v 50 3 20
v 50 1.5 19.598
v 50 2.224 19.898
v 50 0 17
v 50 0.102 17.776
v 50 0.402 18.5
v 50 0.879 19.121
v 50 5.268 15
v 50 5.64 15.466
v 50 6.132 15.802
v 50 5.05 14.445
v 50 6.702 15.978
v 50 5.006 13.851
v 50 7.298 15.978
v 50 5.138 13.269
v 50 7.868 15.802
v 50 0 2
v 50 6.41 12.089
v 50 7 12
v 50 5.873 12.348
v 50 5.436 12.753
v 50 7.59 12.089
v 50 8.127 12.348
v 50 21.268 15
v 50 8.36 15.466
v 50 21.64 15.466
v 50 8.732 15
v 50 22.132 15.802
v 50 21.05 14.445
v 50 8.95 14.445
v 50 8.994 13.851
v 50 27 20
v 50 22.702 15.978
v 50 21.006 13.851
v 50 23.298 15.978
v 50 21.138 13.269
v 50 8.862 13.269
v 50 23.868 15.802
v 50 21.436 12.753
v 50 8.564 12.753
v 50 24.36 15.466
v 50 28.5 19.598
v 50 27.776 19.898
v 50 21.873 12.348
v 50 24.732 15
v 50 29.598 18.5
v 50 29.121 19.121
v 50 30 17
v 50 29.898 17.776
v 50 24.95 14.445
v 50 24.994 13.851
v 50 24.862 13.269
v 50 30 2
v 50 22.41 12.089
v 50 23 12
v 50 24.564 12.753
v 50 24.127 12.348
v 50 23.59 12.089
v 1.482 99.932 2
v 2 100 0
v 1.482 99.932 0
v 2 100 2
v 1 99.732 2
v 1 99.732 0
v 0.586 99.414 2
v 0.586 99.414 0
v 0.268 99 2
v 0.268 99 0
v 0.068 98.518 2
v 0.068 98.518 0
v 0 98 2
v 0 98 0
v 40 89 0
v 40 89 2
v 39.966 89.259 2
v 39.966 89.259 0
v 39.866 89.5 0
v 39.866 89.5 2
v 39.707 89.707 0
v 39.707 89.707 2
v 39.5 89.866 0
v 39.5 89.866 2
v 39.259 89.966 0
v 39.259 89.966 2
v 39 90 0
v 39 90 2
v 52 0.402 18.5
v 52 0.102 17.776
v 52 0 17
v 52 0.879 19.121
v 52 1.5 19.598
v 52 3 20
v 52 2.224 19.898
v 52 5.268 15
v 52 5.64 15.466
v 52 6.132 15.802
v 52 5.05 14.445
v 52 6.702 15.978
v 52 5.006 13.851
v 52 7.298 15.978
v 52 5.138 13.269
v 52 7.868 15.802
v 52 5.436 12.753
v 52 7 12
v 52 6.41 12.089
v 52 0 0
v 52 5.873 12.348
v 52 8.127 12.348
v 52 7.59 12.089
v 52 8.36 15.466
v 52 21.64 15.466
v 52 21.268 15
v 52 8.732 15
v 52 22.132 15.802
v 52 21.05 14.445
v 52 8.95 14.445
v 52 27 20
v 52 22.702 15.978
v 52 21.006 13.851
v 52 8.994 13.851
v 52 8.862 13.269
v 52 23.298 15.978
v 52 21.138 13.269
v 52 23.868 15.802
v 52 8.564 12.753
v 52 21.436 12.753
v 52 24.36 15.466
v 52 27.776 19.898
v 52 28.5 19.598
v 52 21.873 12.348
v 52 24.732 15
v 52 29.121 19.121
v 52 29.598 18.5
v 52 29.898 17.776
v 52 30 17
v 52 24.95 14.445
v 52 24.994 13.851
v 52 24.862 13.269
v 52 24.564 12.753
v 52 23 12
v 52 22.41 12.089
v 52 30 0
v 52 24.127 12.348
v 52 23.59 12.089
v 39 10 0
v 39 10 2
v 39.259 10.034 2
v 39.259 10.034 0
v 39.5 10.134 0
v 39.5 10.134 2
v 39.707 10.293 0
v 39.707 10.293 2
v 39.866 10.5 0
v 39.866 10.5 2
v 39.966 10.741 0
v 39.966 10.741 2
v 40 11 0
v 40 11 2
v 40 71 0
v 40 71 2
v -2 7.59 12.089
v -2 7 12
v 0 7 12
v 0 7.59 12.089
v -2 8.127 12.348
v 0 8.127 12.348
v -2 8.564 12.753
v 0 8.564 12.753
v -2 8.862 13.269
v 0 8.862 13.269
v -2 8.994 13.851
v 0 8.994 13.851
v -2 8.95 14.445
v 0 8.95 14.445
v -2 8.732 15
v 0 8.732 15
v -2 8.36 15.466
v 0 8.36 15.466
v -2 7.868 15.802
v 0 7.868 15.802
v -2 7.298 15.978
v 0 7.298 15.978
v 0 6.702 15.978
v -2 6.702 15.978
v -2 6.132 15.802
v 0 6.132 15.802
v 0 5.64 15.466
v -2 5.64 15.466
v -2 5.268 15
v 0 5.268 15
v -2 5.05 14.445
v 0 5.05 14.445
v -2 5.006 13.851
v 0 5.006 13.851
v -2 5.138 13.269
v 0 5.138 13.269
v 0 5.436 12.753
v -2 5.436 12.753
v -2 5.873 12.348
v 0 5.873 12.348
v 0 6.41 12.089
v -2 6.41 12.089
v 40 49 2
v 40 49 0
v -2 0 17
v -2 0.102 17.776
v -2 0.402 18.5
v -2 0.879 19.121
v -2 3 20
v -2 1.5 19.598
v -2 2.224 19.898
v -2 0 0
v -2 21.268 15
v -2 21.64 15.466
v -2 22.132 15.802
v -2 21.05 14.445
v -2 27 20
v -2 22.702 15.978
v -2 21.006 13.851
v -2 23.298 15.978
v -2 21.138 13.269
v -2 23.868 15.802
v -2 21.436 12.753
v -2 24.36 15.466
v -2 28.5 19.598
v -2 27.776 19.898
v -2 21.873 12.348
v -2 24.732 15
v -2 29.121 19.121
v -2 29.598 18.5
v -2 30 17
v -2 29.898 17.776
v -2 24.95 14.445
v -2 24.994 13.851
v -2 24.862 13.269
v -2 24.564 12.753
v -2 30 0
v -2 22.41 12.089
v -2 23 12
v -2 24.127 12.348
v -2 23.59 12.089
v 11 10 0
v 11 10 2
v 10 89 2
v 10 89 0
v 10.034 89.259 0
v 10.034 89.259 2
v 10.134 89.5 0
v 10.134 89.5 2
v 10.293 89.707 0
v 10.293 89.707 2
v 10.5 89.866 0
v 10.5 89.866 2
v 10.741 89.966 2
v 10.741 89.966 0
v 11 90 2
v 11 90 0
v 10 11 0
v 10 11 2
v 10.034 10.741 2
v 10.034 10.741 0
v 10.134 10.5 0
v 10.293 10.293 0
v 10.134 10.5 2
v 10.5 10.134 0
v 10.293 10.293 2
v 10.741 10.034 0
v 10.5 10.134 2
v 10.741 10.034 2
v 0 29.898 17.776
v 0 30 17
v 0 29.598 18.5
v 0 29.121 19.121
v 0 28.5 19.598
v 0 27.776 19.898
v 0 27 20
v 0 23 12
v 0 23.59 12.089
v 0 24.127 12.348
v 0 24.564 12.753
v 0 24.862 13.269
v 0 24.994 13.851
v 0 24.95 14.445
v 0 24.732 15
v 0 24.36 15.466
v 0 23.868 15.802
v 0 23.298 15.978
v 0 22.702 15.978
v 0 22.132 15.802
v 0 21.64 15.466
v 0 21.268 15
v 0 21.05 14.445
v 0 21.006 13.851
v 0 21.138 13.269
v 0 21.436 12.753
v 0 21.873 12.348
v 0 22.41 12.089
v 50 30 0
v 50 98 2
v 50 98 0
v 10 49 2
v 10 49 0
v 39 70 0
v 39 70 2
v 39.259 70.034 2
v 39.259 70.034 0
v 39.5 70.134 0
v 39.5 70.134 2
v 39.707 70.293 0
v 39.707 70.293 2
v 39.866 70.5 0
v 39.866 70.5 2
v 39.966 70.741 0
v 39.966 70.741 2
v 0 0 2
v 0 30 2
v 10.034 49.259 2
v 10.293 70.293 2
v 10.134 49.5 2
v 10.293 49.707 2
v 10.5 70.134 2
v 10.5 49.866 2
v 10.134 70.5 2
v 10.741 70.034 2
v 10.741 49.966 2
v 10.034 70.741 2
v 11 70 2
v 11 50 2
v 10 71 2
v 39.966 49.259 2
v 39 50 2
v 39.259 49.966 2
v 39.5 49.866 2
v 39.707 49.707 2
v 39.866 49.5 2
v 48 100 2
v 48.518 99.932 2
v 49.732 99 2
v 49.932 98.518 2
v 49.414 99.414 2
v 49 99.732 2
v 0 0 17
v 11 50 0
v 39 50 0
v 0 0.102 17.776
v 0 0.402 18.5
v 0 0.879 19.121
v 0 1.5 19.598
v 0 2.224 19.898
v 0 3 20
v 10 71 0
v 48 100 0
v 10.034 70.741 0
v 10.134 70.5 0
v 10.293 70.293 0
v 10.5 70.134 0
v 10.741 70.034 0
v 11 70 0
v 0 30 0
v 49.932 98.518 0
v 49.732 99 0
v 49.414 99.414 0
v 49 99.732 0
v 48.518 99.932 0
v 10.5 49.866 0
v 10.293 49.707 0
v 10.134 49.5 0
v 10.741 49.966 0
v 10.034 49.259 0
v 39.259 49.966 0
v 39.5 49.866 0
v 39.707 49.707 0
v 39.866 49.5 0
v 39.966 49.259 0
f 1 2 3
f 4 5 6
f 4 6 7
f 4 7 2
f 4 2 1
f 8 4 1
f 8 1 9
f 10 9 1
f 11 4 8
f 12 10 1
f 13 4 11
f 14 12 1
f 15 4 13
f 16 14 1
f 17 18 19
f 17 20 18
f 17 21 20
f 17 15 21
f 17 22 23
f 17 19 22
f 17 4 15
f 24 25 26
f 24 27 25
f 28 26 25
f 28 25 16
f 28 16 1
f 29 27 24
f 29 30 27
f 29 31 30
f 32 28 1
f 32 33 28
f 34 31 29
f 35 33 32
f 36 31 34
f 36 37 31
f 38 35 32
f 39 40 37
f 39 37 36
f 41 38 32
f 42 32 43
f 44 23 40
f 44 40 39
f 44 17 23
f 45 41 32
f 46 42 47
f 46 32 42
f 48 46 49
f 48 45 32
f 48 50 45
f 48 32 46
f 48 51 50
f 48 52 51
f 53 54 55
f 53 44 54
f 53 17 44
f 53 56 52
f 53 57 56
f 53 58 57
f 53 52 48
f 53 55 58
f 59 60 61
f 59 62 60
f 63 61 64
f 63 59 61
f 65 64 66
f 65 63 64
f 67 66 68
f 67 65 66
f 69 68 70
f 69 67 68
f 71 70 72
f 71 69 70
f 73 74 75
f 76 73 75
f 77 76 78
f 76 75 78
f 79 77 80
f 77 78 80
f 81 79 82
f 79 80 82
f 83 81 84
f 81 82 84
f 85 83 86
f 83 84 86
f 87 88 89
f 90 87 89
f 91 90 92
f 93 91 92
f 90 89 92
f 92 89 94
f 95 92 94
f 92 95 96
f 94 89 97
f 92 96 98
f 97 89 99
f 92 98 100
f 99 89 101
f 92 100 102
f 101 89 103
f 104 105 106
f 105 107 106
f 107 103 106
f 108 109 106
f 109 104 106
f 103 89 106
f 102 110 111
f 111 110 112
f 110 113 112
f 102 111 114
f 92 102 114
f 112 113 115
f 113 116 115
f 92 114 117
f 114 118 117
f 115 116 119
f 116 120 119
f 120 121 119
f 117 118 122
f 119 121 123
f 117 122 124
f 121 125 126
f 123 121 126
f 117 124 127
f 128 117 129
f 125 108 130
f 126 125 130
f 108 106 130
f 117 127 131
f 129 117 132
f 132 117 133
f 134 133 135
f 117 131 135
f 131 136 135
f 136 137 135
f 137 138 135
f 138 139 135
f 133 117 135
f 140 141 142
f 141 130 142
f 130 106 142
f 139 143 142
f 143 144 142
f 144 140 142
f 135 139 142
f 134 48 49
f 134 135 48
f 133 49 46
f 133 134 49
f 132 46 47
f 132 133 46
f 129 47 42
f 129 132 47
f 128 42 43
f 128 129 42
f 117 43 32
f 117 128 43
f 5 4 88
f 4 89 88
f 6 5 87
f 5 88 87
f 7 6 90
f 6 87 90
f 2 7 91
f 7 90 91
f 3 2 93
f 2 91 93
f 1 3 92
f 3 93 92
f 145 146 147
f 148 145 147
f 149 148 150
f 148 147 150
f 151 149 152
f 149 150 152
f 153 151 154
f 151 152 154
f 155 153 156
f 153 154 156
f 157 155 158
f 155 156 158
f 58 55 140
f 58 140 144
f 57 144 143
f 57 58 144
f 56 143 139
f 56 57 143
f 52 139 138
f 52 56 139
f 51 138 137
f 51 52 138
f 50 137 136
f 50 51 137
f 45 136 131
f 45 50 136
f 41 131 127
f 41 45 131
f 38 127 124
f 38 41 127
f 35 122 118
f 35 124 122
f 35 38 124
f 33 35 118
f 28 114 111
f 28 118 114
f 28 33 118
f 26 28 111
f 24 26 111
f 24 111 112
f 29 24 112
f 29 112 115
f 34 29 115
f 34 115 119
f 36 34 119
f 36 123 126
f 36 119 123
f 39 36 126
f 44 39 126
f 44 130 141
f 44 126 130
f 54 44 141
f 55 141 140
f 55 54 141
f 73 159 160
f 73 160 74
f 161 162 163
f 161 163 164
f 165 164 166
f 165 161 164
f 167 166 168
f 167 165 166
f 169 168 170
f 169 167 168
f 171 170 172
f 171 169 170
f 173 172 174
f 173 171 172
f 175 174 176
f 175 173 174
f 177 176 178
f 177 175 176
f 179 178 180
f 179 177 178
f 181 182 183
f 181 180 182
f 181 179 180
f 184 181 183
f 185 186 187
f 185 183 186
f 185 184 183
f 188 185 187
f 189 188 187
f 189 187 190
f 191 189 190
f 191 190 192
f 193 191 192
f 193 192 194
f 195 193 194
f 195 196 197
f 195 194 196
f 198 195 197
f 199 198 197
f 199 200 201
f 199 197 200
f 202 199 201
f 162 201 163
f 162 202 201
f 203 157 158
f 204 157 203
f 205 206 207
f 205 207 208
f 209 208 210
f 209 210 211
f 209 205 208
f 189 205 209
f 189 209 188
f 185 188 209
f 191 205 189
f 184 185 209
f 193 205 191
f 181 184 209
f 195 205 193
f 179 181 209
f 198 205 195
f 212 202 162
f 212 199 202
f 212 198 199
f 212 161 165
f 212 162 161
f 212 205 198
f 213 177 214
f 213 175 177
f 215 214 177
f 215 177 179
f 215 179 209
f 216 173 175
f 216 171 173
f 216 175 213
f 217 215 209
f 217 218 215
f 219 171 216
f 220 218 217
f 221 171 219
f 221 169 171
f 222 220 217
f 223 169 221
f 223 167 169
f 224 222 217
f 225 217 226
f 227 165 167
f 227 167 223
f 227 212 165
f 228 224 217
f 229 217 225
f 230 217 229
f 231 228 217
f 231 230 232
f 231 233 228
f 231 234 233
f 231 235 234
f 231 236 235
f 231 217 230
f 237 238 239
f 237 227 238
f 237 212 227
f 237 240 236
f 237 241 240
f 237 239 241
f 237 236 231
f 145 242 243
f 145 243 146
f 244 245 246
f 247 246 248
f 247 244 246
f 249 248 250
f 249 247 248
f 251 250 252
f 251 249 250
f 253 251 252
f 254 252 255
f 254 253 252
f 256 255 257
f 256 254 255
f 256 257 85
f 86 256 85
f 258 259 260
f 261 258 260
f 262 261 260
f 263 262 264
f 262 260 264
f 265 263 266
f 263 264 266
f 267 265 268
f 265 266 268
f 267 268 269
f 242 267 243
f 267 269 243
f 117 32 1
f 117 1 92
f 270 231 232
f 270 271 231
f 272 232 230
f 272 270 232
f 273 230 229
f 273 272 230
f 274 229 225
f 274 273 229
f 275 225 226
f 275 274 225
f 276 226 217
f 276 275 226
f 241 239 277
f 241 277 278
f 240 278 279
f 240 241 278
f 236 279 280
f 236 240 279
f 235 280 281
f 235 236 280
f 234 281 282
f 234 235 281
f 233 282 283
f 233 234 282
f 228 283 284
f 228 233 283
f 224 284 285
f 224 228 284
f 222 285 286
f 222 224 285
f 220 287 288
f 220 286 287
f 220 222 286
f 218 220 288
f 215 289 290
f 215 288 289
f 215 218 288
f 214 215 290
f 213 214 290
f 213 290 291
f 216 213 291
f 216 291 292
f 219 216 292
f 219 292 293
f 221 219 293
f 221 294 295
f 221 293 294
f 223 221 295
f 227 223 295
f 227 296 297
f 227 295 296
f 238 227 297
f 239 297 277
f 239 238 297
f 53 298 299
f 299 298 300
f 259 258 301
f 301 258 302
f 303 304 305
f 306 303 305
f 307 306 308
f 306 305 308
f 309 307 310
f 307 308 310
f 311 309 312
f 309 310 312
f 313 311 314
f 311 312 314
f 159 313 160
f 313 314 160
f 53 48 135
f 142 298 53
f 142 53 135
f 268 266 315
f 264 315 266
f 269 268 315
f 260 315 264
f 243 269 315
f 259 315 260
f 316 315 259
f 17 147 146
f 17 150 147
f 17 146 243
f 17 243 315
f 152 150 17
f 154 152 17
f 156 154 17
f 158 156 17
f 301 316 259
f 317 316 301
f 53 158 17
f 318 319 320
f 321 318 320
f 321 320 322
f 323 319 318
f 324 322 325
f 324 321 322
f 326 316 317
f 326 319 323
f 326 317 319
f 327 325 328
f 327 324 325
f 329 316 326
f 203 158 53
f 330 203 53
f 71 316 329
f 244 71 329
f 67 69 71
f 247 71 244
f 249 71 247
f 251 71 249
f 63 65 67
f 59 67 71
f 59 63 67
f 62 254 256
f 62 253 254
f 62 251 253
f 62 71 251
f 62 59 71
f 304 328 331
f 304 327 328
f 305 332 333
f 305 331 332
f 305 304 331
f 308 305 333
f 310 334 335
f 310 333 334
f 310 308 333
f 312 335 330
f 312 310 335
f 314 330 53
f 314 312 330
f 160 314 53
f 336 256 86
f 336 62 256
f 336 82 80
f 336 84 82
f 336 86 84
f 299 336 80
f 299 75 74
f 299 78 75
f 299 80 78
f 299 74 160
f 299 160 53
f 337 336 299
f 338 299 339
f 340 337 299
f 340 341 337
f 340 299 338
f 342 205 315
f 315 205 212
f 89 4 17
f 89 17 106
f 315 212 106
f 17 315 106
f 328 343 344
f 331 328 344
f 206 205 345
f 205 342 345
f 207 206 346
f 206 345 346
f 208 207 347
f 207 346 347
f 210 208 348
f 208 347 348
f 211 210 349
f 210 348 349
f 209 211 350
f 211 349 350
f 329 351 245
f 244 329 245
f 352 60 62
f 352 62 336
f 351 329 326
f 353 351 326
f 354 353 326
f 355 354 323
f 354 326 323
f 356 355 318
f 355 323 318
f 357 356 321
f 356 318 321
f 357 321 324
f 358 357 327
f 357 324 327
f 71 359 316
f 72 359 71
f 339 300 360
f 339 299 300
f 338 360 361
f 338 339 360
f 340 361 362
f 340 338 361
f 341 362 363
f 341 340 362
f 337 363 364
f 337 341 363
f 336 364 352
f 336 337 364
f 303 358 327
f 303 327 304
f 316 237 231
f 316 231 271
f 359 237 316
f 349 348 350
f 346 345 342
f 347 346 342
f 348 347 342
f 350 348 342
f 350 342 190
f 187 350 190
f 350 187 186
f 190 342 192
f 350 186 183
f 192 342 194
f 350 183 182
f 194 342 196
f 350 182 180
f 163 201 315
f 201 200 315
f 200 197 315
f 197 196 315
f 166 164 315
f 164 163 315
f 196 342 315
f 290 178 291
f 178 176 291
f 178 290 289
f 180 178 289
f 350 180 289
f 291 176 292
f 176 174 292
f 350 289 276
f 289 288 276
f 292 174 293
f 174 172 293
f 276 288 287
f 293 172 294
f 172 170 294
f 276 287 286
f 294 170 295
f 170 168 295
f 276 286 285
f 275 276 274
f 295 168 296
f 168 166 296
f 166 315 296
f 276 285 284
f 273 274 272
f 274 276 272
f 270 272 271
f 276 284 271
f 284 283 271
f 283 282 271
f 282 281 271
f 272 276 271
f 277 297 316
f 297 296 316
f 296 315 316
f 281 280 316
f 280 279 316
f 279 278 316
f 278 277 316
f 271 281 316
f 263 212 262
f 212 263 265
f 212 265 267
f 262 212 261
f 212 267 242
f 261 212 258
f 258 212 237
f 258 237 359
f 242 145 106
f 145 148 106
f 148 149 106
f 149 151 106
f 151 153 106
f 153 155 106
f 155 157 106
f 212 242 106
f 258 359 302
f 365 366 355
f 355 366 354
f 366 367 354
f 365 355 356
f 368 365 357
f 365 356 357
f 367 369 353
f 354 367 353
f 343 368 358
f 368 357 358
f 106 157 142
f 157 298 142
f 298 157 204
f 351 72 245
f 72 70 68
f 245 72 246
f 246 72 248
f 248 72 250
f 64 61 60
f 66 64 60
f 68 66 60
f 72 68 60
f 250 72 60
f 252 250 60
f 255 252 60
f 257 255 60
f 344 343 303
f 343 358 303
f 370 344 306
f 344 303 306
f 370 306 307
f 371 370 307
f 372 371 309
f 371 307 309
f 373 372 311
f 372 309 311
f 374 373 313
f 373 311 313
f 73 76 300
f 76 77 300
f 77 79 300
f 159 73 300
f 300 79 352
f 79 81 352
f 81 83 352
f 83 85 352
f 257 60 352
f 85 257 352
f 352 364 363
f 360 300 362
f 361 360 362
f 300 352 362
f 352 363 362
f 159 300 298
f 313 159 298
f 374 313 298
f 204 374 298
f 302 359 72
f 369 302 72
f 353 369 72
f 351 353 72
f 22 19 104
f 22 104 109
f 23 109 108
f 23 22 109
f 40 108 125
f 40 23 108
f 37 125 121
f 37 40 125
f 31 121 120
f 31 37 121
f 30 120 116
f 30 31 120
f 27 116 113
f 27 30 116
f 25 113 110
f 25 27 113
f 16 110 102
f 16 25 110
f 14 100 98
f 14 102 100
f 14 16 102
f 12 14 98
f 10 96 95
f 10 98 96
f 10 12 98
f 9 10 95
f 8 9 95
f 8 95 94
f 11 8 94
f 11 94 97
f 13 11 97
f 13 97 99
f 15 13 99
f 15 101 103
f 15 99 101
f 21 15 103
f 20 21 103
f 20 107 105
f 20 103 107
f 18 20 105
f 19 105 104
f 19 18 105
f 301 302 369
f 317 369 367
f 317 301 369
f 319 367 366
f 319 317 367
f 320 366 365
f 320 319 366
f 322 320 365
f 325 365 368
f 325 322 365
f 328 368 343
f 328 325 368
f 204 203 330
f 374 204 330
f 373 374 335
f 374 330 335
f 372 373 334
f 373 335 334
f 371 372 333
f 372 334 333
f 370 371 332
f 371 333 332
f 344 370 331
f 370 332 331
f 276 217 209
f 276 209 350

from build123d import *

# Parameters (mm, degrees)
CYLINDER001_R               = 2
CYLINDER001_DEPTH           = 10
CYLINDER001_PITCH_ANGLE     = 90
CYLINDER001_PLACEMENT_ANGLE = -1e-06
CYLINDER_R                  = 2
CYLINDER_DEPTH              = 10
CYLINDER_PITCH_ANGLE        = 90
CYLINDER_PLACEMENT_ANGLE    = -1e-06
BOX003_W                    = 2
BOX003_H                    = 30
BOX003_DEPTH                = 20
FILLET004_R                 = 3
CYLINDER003_R               = 2
CYLINDER003_DEPTH           = 10
CYLINDER003_PITCH_ANGLE     = 90
CYLINDER003_PLACEMENT_ANGLE = -1e-06
CYLINDER002_R               = 2
CYLINDER002_DEPTH           = 10
CYLINDER002_PITCH_ANGLE     = 90
CYLINDER002_PLACEMENT_ANGLE = -1e-06
BOX004_W                    = 2
BOX004_H                    = 30
BOX004_DEPTH                = 20
FILLET005_R                 = 3
BOX002_W                    = 30
BOX002_H                    = 40
BOX002_DEPTH                = 10
FILLET003_R                 = 1
BOX001_W                    = 30
BOX001_H                    = 20
BOX001_DEPTH                = 10
FILLET002_R                 = 1
BOX_W                       = 50
BOX_H                       = 100
BOX_DEPTH                   = 2
FILLET_R                    = 2
FILLET001_R                 = 2


with BuildPart() as cylinder001:
    # Cylinder001 → Cylinder001 (new body)
    with BuildSketch(Plane.XY):
        Circle(CYLINDER001_R)
    extrude(amount=CYLINDER001_DEPTH)


with BuildPart() as cylinder001_1:
    # Cylinder001 pitch: moved
    add(cylinder001.part.rotate(Axis((0, 0, 0), (0, 1, 0)), CYLINDER001_PITCH_ANGLE))


with BuildPart() as cylinder001_2:
    # Cylinder001 placement: moved
    add(cylinder001_1.part.moved(Location((-6, 23, 14))).rotate(Axis((-6, 23, 14), (0, 0, 1)), CYLINDER001_PLACEMENT_ANGLE))


with BuildPart() as cylinder:
    # Cylinder → Cylinder (new body)
    with BuildSketch(Plane.XY):
        Circle(CYLINDER_R)
    extrude(amount=CYLINDER_DEPTH)


with BuildPart() as cylinder_1:
    # Cylinder pitch: moved
    add(cylinder.part.rotate(Axis((0, 0, 0), (0, 1, 0)), CYLINDER_PITCH_ANGLE))


with BuildPart() as cylinder_2:
    # Cylinder placement: moved
    add(cylinder_1.part.moved(Location((-6, 7, 14))).rotate(Axis((-6, 7, 14), (0, 0, 1)), CYLINDER_PLACEMENT_ANGLE))


with BuildPart() as cut003:
    # Box003 → Box003 (new body)
    with BuildSketch(Plane(origin=(-2, 0, 0), x_dir=(1, 0, 0), z_dir=(0, 0, 1))):
        with Locations((1, 15)):
            Rectangle(BOX003_W, BOX003_H)
    extrude(amount=BOX003_DEPTH)

    # Fillet004
    fillet004_edges = [cut003.edges().sort_by_distance(p)[0] for p in [
        (-1, 0, 20),
        (-1, 30, 20),
    ]]
    fillet(fillet004_edges, radius=FILLET004_R)

    # Cut002: cut Cylinder
    add(cylinder_2.part, mode=Mode.SUBTRACT)

    # Cut003: cut Cylinder001
    add(cylinder001_2.part, mode=Mode.SUBTRACT)


with BuildPart() as cylinder003:
    # Cylinder003 → Cylinder003 (new body)
    with BuildSketch(Plane.XY):
        Circle(CYLINDER003_R)
    extrude(amount=CYLINDER003_DEPTH)


with BuildPart() as cylinder003_1:
    # Cylinder003 pitch: moved
    add(cylinder003.part.rotate(Axis((0, 0, 0), (0, 1, 0)), CYLINDER003_PITCH_ANGLE))


with BuildPart() as cylinder003_2:
    # Cylinder003 placement: moved
    add(cylinder003_1.part.moved(Location((-6, 23, 14))).rotate(Axis((-6, 23, 14), (0, 0, 1)), CYLINDER003_PLACEMENT_ANGLE))


with BuildPart() as cylinder002:
    # Cylinder002 → Cylinder002 (new body)
    with BuildSketch(Plane.XY):
        Circle(CYLINDER002_R)
    extrude(amount=CYLINDER002_DEPTH)


with BuildPart() as cylinder002_1:
    # Cylinder002 pitch: moved
    add(cylinder002.part.rotate(Axis((0, 0, 0), (0, 1, 0)), CYLINDER002_PITCH_ANGLE))


with BuildPart() as cylinder002_2:
    # Cylinder002 placement: moved
    add(cylinder002_1.part.moved(Location((-6, 7, 14))).rotate(Axis((-6, 7, 14), (0, 0, 1)), CYLINDER002_PLACEMENT_ANGLE))


with BuildPart() as cut005:
    # Box004 → Box004 (new body)
    with BuildSketch(Plane(origin=(-2, 0, 0), x_dir=(1, 0, 0), z_dir=(0, 0, 1))):
        with Locations((1, 15)):
            Rectangle(BOX004_W, BOX004_H)
    extrude(amount=BOX004_DEPTH)

    # Fillet005
    fillet005_edges = [cut005.edges().sort_by_distance(p)[0] for p in [
        (-1, 0, 20),
        (-1, 30, 20),
    ]]
    fillet(fillet005_edges, radius=FILLET005_R)

    # Cut004: cut Cylinder002
    add(cylinder002_2.part, mode=Mode.SUBTRACT)

    # Cut005: cut Cylinder003
    add(cylinder003_2.part, mode=Mode.SUBTRACT)


with BuildPart() as cut005_1:
    # Cut005 placement: moved
    add(cut005.part.moved(Location((52, 0, 0))))


with BuildPart() as fillet003:
    # Box002 → Box002 (new body)
    with BuildSketch(Plane(origin=(10, 10, 0), x_dir=(1, 0, 0), z_dir=(0, 0, 1))):
        with Locations((15, 20)):
            Rectangle(BOX002_W, BOX002_H)
    extrude(amount=BOX002_DEPTH)

    # Fillet003
    fillet003_edges = [fillet003.edges().sort_by_distance(p)[0] for p in [
        (10, 10, 5),
        (10, 50, 5),
        (40, 10, 5),
        (40, 50, 5),
    ]]
    fillet(fillet003_edges, radius=FILLET003_R)


with BuildPart() as fillet002:
    # Box001 → Box001 (new body)
    with BuildSketch(Plane(origin=(10, 70, 0), x_dir=(1, 0, 0), z_dir=(0, 0, 1))):
        with Locations((15, 10)):
            Rectangle(BOX001_W, BOX001_H)
    extrude(amount=BOX001_DEPTH)

    # Fillet002
    fillet002_edges = [fillet002.edges().sort_by_distance(p)[0] for p in [
        (10, 70, 5),
        (10, 90, 5),
        (40, 70, 5),
        (40, 90, 5),
    ]]
    fillet(fillet002_edges, radius=FILLET002_R)


with BuildPart() as fusion:
    # Box → Box (new body)
    with BuildSketch(Plane.XY):
        with Locations((25, 50)):
            Rectangle(BOX_W, BOX_H)
    extrude(amount=BOX_DEPTH)

    # Fillet
    fillet_edges = [fusion.edges().sort_by_distance(p)[0] for p in [
        (50, 100, 1),
    ]]
    fillet(fillet_edges, radius=FILLET_R)

    # Fillet001
    fillet001_edges = [fusion.edges().sort_by_distance(p)[0] for p in [
        (0, 100, 1),
    ]]
    fillet(fillet001_edges, radius=FILLET001_R)

    # Cut: cut Fillet002
    add(fillet002.part, mode=Mode.SUBTRACT)

    # Cut001: cut Fillet003
    add(fillet003.part, mode=Mode.SUBTRACT)

    # Fusion: union Cut003, Cut005
    add(cut003.part)
    add(cut005_1.part)


solid = fusion.part
